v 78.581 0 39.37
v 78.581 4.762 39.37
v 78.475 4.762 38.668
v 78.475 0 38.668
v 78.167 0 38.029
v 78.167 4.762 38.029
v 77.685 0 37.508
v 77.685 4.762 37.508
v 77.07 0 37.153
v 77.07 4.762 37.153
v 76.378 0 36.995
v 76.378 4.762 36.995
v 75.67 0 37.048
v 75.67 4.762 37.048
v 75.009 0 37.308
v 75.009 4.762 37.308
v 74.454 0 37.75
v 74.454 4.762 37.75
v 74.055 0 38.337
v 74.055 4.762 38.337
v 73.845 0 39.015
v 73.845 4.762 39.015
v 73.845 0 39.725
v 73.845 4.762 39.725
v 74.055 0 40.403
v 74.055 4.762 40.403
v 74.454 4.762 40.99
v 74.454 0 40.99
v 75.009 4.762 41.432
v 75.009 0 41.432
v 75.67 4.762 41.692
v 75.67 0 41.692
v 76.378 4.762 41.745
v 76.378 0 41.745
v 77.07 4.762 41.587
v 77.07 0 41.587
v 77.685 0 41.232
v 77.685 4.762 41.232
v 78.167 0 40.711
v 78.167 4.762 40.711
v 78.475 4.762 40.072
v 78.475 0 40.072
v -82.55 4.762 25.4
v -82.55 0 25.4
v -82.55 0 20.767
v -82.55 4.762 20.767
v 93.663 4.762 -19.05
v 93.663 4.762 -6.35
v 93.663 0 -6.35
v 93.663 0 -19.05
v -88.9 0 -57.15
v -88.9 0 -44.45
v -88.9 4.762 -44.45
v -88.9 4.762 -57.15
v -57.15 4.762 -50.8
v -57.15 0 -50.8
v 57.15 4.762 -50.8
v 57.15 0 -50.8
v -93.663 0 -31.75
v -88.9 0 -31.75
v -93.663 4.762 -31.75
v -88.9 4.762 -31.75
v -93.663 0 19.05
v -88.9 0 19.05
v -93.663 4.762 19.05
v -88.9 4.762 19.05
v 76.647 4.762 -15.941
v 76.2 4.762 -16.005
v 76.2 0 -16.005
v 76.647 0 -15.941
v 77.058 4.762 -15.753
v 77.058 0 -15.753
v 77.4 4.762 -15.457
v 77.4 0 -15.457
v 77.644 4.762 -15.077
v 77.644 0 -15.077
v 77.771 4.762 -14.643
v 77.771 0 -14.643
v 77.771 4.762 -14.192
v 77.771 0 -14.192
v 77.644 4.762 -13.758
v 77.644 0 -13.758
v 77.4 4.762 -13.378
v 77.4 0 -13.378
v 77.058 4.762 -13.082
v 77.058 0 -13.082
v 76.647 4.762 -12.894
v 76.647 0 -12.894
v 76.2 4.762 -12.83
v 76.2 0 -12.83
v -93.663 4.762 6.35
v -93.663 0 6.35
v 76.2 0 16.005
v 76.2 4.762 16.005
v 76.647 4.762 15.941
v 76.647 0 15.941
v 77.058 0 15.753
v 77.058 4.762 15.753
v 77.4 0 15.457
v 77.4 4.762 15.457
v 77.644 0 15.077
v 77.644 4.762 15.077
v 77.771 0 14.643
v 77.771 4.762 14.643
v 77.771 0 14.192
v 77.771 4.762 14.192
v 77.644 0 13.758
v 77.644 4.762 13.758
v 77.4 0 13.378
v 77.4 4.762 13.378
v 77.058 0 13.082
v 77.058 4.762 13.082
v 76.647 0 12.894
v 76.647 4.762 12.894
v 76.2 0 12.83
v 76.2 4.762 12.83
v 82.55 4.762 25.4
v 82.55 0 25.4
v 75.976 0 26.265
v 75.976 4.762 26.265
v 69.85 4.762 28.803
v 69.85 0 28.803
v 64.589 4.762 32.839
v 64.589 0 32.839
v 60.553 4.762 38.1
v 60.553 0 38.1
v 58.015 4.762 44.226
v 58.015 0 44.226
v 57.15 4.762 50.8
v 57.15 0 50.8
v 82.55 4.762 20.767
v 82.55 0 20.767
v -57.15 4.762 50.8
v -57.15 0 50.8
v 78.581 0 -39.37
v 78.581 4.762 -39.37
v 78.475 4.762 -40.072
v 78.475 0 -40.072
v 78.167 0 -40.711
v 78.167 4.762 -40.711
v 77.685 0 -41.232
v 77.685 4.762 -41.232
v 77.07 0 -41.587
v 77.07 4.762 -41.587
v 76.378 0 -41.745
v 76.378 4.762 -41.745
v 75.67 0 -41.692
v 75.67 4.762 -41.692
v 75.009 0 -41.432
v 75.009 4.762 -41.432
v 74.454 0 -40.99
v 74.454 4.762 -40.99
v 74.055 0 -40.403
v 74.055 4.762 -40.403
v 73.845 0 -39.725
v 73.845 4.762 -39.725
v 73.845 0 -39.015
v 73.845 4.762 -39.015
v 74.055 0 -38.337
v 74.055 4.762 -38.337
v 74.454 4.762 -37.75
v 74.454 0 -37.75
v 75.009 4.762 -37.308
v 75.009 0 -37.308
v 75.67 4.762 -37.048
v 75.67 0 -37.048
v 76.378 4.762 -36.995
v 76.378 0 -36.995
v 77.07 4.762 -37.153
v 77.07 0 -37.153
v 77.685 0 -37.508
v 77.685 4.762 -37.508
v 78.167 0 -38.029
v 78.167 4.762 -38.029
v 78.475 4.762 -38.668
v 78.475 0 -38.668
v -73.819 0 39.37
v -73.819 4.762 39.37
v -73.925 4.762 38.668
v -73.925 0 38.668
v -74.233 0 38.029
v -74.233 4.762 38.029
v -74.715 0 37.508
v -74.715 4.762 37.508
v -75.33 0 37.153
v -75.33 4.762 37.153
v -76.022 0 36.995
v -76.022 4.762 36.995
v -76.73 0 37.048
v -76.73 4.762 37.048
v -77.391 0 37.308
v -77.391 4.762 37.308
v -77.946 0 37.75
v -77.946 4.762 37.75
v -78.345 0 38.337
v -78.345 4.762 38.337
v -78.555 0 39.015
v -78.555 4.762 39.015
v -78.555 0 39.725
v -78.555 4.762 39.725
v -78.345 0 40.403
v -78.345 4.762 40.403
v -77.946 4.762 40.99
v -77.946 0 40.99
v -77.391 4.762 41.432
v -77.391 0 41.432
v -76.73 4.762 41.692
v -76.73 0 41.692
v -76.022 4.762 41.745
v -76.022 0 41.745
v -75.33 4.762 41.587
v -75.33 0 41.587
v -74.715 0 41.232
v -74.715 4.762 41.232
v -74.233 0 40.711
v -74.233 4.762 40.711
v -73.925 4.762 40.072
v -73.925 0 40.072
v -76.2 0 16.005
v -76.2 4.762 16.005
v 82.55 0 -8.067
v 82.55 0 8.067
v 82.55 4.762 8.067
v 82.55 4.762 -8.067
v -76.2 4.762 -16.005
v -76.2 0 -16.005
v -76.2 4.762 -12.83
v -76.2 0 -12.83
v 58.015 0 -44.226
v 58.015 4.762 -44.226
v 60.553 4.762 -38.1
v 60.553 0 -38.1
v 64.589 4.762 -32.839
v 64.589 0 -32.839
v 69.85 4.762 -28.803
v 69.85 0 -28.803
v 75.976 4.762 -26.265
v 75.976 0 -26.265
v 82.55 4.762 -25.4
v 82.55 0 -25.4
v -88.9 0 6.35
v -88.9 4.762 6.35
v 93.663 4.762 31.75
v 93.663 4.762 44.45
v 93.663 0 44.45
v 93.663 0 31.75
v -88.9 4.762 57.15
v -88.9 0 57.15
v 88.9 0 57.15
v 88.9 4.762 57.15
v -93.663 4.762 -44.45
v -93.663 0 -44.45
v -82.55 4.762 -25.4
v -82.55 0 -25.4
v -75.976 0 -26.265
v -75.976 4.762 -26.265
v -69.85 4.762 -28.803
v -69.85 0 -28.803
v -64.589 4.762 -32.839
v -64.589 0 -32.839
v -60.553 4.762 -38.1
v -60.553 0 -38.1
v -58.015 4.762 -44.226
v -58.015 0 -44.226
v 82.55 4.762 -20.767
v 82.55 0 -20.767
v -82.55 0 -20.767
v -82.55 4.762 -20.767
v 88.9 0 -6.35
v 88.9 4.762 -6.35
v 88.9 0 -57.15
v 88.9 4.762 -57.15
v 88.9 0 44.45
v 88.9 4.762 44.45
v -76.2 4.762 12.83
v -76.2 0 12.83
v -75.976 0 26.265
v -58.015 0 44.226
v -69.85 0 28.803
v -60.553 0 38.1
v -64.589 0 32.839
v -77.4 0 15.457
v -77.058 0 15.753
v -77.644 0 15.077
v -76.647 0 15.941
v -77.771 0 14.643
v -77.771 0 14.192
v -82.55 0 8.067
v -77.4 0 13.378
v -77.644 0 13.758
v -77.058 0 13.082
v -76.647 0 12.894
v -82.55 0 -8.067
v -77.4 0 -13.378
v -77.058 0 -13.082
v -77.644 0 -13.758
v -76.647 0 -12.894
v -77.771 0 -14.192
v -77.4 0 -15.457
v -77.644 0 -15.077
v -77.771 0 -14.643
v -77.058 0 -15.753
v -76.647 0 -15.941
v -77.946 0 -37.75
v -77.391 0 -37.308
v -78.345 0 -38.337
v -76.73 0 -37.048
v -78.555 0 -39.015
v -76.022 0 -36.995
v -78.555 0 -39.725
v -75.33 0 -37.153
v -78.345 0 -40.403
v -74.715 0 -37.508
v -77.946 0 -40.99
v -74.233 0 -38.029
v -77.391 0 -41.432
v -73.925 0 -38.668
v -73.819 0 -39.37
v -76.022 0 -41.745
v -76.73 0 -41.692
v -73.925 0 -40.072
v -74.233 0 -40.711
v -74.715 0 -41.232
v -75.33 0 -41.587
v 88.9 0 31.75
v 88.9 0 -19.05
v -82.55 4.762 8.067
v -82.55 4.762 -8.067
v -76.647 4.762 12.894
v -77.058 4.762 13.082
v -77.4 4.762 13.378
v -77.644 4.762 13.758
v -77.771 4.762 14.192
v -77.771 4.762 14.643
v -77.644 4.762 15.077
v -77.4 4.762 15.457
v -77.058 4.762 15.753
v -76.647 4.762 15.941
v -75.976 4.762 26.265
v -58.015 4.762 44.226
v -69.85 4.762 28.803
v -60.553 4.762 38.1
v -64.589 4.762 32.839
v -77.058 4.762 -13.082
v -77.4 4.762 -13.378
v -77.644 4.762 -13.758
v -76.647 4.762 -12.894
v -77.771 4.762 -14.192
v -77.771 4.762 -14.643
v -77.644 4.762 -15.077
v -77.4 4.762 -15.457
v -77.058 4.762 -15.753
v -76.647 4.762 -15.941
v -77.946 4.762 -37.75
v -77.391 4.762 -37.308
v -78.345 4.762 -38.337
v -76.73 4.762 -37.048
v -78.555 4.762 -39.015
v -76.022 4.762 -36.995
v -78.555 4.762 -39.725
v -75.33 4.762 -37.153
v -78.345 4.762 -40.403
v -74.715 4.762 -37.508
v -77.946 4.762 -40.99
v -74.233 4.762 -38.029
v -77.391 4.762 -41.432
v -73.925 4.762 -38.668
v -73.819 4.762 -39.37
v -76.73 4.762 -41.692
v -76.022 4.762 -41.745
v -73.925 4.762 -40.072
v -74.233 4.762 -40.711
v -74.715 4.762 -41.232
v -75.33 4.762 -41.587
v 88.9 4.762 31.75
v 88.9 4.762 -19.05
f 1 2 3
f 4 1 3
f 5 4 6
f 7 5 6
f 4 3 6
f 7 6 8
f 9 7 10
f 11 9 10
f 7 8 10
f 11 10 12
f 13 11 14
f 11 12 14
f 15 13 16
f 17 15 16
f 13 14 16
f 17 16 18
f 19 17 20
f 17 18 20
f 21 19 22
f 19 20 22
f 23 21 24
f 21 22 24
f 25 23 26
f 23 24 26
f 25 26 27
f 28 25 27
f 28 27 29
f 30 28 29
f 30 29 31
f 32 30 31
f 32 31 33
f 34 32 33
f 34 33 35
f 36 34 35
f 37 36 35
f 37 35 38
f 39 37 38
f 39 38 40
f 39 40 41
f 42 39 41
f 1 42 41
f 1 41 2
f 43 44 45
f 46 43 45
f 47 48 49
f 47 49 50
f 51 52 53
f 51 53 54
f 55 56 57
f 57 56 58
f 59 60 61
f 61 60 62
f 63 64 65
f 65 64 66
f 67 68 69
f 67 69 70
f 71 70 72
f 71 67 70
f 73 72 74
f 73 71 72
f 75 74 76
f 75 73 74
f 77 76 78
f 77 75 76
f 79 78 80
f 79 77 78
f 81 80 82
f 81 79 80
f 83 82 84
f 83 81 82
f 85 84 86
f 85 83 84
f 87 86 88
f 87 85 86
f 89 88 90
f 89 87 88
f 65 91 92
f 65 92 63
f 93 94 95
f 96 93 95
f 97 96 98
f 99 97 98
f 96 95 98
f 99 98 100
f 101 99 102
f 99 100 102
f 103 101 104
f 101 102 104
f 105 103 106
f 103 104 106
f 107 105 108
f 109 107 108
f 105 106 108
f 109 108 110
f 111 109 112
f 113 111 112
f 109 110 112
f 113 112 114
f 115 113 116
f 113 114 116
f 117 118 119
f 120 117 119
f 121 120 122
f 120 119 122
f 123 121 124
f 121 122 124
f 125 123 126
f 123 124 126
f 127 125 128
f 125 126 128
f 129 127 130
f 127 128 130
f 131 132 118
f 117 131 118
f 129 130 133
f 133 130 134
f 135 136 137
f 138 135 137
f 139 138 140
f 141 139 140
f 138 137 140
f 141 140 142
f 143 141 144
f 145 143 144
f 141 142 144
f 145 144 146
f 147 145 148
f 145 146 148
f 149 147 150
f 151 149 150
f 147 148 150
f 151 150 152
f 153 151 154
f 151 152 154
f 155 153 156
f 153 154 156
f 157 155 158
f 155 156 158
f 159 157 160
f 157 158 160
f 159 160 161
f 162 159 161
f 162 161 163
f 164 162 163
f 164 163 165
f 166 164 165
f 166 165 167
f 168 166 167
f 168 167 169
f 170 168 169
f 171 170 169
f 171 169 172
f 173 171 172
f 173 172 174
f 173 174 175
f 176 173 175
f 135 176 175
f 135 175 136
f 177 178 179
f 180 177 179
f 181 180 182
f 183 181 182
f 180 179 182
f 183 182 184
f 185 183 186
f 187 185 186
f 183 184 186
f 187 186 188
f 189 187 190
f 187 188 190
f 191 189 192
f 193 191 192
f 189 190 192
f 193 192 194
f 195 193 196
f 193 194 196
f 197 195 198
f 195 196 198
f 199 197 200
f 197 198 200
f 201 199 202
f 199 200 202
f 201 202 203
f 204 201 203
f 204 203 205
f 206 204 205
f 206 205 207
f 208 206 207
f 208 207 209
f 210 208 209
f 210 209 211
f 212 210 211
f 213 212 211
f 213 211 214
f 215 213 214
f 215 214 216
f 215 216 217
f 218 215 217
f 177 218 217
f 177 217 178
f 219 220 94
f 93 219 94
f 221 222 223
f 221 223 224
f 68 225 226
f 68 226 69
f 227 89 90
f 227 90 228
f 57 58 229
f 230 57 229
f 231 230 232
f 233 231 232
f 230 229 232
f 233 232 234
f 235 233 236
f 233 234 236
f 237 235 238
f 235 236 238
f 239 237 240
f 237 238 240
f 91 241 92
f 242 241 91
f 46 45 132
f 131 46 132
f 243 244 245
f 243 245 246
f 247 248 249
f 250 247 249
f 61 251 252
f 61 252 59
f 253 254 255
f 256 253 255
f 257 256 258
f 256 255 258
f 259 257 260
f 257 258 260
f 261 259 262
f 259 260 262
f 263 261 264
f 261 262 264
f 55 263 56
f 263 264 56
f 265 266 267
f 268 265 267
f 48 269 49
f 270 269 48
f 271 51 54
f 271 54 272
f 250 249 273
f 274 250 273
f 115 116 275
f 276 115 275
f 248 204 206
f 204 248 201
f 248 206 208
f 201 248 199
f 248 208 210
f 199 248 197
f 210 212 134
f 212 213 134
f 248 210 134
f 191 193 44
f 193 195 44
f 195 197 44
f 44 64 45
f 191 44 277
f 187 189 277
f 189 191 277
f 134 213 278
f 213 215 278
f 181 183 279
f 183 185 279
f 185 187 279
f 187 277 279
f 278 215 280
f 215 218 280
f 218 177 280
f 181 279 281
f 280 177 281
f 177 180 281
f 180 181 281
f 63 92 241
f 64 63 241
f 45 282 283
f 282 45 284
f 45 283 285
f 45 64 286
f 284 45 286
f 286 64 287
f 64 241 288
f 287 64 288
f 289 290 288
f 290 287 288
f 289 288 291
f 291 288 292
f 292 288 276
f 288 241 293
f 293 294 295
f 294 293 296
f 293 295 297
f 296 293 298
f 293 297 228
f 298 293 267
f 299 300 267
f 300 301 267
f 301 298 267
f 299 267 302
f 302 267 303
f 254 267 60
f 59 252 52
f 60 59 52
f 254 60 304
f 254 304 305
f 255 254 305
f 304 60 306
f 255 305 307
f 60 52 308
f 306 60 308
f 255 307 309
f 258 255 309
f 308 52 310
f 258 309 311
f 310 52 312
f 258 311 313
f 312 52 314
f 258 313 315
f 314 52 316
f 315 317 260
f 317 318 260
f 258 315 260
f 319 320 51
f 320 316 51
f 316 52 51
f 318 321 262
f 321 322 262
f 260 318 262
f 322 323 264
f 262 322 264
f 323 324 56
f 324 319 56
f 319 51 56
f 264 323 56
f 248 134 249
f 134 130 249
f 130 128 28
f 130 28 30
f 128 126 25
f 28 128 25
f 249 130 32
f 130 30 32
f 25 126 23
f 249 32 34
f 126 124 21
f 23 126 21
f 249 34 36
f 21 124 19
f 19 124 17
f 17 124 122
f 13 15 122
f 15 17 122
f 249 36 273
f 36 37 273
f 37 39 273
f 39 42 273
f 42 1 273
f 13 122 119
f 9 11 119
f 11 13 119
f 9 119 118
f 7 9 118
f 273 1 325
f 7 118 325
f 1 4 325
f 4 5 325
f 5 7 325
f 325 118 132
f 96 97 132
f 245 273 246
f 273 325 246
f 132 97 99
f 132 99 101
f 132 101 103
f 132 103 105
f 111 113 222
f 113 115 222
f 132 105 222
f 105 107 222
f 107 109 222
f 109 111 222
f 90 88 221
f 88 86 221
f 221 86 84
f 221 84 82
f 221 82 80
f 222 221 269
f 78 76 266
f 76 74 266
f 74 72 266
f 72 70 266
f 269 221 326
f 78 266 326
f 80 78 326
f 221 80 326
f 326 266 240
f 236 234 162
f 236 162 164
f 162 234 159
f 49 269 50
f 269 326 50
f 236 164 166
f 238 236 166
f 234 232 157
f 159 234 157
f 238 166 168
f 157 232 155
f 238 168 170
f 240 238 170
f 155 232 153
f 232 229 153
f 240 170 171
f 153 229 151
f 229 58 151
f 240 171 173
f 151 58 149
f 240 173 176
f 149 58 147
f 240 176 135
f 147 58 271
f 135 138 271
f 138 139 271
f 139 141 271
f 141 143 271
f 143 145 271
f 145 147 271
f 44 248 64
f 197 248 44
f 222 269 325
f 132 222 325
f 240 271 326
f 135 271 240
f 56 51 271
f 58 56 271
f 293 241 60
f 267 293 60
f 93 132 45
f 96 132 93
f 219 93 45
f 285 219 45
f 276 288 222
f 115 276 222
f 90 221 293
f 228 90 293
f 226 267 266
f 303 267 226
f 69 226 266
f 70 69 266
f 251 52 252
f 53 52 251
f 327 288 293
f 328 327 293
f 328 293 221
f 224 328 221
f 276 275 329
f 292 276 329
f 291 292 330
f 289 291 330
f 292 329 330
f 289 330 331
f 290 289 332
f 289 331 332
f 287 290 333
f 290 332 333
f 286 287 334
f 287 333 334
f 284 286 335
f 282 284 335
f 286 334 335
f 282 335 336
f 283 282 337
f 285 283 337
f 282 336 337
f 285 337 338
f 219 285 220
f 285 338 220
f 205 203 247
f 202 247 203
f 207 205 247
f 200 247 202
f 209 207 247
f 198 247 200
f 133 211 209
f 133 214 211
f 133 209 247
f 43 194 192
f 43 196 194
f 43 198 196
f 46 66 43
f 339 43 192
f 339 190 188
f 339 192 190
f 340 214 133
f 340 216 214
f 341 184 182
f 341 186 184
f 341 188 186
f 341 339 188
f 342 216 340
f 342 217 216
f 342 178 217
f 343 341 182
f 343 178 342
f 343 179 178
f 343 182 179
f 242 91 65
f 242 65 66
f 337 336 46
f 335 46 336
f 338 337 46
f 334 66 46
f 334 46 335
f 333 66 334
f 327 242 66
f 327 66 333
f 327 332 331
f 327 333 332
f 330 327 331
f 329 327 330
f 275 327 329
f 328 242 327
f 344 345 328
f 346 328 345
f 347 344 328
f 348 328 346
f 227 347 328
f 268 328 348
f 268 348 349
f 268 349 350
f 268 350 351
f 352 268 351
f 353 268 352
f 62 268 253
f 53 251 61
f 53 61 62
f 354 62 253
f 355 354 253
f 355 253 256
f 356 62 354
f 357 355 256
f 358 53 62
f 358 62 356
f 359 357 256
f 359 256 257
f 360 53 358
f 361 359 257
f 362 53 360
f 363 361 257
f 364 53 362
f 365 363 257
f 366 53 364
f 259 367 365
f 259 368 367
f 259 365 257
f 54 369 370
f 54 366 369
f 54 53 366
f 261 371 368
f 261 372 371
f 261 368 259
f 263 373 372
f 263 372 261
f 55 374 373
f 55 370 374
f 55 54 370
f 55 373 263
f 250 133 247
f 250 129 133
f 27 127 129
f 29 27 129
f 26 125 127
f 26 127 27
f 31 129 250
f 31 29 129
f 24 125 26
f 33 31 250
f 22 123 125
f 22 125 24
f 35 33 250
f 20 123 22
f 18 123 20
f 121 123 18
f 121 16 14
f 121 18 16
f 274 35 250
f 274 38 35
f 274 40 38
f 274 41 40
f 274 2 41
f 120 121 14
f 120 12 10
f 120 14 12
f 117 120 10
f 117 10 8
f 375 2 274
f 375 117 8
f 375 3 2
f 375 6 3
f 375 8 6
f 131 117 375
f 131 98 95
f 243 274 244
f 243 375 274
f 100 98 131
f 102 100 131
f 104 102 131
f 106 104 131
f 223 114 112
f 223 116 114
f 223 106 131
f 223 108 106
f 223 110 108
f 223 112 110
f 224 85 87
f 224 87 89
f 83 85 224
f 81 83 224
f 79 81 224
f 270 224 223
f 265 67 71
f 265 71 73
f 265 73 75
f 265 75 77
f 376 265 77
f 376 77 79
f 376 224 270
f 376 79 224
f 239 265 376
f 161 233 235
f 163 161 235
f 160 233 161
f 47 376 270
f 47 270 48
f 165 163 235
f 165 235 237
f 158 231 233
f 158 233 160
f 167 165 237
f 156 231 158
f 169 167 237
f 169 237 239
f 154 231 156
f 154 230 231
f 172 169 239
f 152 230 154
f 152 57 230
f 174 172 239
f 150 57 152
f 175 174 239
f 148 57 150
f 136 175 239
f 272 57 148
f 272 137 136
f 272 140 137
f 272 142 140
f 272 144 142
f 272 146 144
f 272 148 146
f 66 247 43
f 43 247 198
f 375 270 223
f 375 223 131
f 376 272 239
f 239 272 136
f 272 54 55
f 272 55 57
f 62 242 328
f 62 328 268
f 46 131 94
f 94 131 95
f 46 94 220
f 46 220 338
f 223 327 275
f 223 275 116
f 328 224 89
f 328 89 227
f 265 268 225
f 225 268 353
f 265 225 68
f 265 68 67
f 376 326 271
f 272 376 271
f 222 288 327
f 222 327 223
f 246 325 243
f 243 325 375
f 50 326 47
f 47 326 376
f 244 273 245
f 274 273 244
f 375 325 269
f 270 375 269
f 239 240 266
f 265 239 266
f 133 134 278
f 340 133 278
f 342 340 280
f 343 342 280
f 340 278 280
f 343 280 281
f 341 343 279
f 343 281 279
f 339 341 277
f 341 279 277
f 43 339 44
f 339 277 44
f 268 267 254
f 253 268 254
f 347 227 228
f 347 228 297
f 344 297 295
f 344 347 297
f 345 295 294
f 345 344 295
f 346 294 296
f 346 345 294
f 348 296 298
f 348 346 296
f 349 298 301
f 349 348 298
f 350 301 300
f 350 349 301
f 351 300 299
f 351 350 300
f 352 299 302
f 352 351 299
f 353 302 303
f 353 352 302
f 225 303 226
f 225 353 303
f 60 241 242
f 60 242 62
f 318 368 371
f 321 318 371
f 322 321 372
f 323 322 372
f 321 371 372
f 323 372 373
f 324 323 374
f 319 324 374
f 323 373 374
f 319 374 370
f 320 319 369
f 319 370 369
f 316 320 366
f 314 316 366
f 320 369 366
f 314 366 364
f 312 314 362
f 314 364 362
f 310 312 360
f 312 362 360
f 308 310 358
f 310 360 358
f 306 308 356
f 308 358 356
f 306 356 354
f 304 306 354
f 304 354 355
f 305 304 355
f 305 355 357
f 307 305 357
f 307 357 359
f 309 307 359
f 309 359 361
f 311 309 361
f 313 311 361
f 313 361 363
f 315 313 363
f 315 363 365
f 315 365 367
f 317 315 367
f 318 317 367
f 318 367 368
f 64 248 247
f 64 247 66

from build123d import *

# Parameters (mm, degrees)
SKETCH1_W           = 177.8
SKETCH1_H           = 114.3
SKETCH1_W_2         = 165.1
SKETCH1_H_2         = 16.134929366
BOSS_EXTRUDE1_DEPTH = 4.7625
CUT_EXTRUDE1_DEPTH  = 5.7625
SKETCH4_R           = 2.38125
CUT_EXTRUDE2_DEPTH  = 5.7625
SKETCH7_W           = 12.7
SKETCH7_H           = 4.7625
BOSS_EXTRUDE2_DEPTH = 4.7625
SKETCH8_W           = 12.7
SKETCH8_H           = 4.7625
BOSS_EXTRUDE3_DEPTH = 4.7625


with BuildPart() as part:
    # Sketch1 → Boss-Extrude1 (new body)
    with BuildSketch(Plane(origin=(0, 0, 0), x_dir=(1, 0, 0), z_dir=(0, 1, 0))):
        Rectangle(SKETCH1_W, SKETCH1_H)
        with BuildLine():
            Line((-82.55, -25.4), (-82.55, -20.767464683))
            Line((-82.55, -20.767464683), (82.55, -20.767464683))
            Line((82.55, -20.767464683), (82.55, -25.4))
            ThreePointArc((82.55, -25.4), (64.589487758, -32.839487758), (57.15, -50.8))
            Line((57.15, -50.8), (-57.15, -50.8))
            ThreePointArc((-57.15, -50.8), (-64.589487758, -32.839487758), (-82.55, -25.4))
        make_face(mode=Mode.SUBTRACT)
        Rectangle(SKETCH1_W_2, SKETCH1_H_2, mode=Mode.SUBTRACT)
        with BuildLine():
            Line((82.55, 20.767464683), (-82.55, 20.767464683))
            Line((-82.55, 20.767464683), (-82.55, 25.4))
            ThreePointArc((-82.55, 25.4), (-64.589487758, 32.839487758), (-57.15, 50.8))
            Line((-57.15, 50.8), (57.15, 50.8))
            ThreePointArc((57.15, 50.8), (64.589487758, 32.839487758), (82.55, 25.4))
            Line((82.55, 25.4), (82.55, 20.767464683))
        make_face(mode=Mode.SUBTRACT)
    extrude(amount=BOSS_EXTRUDE1_DEPTH)

    # Sketch3 → Cut-Extrude1 (cut, through all)
    with BuildSketch(Plane(origin=(0, 4.7625, 0), x_dir=(1, 0, 0), z_dir=(0, 1, 0))):
        with BuildLine():
            Line((-76.2, 16.004964683), (76.2, 16.004964683))
            ThreePointArc((76.2, 16.004964683), (77.7875, 14.417464683), (76.2, 12.829964683))
            Line((76.2, 12.829964683), (-76.2, 12.829964683))
            ThreePointArc((-76.2, 12.829964683), (-77.7875, 14.417464683), (-76.2, 16.004964683))
        make_face()
        with BuildLine():
            Line((-76.2, -16.004964683), (76.2, -16.004964683))
            ThreePointArc((76.2, -16.004964683), (77.7875, -14.417464683), (76.2, -12.829964683))
            Line((76.2, -12.829964683), (-76.2, -12.829964683))
            ThreePointArc((-76.2, -12.829964683), (-77.7875, -14.417464683), (-76.2, -16.004964683))
        make_face()
    extrude(amount=-CUT_EXTRUDE1_DEPTH, mode=Mode.SUBTRACT)

    # Sketch4 → Cut-Extrude2 (cut, through all)
    with BuildSketch(Plane(origin=(0, 4.7625, 0), x_dir=(1, 0, 0), z_dir=(0, 1, 0))):
        with Locations((-76.2, 39.37)):
            Circle(SKETCH4_R)
        with Locations((-76.2, -39.37)):
            Circle(SKETCH4_R)
        with Locations((76.2, -39.37)):
            Circle(SKETCH4_R)
        with Locations((76.2, 39.37)):
            Circle(SKETCH4_R)
    extrude(amount=-CUT_EXTRUDE2_DEPTH, mode=Mode.SUBTRACT)

    # Sketch7 → Boss-Extrude2 (add)
    with BuildSketch(Plane(origin=(88.9, 0, 0), x_dir=(0, 0, -1), z_dir=(1, 0, 0))):
        with Locations((-38.1, 2.38125)):
            Rectangle(SKETCH7_W, SKETCH7_H)
        with Locations((12.7, 2.38125)):
            Rectangle(SKETCH7_W, SKETCH7_H)
    extrude(amount=BOSS_EXTRUDE2_DEPTH)

    # Sketch8 → Boss-Extrude3 (add)
    with BuildSketch(Plane.ZY.offset(88.9)):
        with Locations((-38.1, 2.38125)):
            Rectangle(SKETCH8_W, SKETCH8_H)
        with Locations((12.7, 2.38125)):
            Rectangle(SKETCH8_W, SKETCH8_H)
    extrude(amount=BOSS_EXTRUDE3_DEPTH)


solid = part.part
